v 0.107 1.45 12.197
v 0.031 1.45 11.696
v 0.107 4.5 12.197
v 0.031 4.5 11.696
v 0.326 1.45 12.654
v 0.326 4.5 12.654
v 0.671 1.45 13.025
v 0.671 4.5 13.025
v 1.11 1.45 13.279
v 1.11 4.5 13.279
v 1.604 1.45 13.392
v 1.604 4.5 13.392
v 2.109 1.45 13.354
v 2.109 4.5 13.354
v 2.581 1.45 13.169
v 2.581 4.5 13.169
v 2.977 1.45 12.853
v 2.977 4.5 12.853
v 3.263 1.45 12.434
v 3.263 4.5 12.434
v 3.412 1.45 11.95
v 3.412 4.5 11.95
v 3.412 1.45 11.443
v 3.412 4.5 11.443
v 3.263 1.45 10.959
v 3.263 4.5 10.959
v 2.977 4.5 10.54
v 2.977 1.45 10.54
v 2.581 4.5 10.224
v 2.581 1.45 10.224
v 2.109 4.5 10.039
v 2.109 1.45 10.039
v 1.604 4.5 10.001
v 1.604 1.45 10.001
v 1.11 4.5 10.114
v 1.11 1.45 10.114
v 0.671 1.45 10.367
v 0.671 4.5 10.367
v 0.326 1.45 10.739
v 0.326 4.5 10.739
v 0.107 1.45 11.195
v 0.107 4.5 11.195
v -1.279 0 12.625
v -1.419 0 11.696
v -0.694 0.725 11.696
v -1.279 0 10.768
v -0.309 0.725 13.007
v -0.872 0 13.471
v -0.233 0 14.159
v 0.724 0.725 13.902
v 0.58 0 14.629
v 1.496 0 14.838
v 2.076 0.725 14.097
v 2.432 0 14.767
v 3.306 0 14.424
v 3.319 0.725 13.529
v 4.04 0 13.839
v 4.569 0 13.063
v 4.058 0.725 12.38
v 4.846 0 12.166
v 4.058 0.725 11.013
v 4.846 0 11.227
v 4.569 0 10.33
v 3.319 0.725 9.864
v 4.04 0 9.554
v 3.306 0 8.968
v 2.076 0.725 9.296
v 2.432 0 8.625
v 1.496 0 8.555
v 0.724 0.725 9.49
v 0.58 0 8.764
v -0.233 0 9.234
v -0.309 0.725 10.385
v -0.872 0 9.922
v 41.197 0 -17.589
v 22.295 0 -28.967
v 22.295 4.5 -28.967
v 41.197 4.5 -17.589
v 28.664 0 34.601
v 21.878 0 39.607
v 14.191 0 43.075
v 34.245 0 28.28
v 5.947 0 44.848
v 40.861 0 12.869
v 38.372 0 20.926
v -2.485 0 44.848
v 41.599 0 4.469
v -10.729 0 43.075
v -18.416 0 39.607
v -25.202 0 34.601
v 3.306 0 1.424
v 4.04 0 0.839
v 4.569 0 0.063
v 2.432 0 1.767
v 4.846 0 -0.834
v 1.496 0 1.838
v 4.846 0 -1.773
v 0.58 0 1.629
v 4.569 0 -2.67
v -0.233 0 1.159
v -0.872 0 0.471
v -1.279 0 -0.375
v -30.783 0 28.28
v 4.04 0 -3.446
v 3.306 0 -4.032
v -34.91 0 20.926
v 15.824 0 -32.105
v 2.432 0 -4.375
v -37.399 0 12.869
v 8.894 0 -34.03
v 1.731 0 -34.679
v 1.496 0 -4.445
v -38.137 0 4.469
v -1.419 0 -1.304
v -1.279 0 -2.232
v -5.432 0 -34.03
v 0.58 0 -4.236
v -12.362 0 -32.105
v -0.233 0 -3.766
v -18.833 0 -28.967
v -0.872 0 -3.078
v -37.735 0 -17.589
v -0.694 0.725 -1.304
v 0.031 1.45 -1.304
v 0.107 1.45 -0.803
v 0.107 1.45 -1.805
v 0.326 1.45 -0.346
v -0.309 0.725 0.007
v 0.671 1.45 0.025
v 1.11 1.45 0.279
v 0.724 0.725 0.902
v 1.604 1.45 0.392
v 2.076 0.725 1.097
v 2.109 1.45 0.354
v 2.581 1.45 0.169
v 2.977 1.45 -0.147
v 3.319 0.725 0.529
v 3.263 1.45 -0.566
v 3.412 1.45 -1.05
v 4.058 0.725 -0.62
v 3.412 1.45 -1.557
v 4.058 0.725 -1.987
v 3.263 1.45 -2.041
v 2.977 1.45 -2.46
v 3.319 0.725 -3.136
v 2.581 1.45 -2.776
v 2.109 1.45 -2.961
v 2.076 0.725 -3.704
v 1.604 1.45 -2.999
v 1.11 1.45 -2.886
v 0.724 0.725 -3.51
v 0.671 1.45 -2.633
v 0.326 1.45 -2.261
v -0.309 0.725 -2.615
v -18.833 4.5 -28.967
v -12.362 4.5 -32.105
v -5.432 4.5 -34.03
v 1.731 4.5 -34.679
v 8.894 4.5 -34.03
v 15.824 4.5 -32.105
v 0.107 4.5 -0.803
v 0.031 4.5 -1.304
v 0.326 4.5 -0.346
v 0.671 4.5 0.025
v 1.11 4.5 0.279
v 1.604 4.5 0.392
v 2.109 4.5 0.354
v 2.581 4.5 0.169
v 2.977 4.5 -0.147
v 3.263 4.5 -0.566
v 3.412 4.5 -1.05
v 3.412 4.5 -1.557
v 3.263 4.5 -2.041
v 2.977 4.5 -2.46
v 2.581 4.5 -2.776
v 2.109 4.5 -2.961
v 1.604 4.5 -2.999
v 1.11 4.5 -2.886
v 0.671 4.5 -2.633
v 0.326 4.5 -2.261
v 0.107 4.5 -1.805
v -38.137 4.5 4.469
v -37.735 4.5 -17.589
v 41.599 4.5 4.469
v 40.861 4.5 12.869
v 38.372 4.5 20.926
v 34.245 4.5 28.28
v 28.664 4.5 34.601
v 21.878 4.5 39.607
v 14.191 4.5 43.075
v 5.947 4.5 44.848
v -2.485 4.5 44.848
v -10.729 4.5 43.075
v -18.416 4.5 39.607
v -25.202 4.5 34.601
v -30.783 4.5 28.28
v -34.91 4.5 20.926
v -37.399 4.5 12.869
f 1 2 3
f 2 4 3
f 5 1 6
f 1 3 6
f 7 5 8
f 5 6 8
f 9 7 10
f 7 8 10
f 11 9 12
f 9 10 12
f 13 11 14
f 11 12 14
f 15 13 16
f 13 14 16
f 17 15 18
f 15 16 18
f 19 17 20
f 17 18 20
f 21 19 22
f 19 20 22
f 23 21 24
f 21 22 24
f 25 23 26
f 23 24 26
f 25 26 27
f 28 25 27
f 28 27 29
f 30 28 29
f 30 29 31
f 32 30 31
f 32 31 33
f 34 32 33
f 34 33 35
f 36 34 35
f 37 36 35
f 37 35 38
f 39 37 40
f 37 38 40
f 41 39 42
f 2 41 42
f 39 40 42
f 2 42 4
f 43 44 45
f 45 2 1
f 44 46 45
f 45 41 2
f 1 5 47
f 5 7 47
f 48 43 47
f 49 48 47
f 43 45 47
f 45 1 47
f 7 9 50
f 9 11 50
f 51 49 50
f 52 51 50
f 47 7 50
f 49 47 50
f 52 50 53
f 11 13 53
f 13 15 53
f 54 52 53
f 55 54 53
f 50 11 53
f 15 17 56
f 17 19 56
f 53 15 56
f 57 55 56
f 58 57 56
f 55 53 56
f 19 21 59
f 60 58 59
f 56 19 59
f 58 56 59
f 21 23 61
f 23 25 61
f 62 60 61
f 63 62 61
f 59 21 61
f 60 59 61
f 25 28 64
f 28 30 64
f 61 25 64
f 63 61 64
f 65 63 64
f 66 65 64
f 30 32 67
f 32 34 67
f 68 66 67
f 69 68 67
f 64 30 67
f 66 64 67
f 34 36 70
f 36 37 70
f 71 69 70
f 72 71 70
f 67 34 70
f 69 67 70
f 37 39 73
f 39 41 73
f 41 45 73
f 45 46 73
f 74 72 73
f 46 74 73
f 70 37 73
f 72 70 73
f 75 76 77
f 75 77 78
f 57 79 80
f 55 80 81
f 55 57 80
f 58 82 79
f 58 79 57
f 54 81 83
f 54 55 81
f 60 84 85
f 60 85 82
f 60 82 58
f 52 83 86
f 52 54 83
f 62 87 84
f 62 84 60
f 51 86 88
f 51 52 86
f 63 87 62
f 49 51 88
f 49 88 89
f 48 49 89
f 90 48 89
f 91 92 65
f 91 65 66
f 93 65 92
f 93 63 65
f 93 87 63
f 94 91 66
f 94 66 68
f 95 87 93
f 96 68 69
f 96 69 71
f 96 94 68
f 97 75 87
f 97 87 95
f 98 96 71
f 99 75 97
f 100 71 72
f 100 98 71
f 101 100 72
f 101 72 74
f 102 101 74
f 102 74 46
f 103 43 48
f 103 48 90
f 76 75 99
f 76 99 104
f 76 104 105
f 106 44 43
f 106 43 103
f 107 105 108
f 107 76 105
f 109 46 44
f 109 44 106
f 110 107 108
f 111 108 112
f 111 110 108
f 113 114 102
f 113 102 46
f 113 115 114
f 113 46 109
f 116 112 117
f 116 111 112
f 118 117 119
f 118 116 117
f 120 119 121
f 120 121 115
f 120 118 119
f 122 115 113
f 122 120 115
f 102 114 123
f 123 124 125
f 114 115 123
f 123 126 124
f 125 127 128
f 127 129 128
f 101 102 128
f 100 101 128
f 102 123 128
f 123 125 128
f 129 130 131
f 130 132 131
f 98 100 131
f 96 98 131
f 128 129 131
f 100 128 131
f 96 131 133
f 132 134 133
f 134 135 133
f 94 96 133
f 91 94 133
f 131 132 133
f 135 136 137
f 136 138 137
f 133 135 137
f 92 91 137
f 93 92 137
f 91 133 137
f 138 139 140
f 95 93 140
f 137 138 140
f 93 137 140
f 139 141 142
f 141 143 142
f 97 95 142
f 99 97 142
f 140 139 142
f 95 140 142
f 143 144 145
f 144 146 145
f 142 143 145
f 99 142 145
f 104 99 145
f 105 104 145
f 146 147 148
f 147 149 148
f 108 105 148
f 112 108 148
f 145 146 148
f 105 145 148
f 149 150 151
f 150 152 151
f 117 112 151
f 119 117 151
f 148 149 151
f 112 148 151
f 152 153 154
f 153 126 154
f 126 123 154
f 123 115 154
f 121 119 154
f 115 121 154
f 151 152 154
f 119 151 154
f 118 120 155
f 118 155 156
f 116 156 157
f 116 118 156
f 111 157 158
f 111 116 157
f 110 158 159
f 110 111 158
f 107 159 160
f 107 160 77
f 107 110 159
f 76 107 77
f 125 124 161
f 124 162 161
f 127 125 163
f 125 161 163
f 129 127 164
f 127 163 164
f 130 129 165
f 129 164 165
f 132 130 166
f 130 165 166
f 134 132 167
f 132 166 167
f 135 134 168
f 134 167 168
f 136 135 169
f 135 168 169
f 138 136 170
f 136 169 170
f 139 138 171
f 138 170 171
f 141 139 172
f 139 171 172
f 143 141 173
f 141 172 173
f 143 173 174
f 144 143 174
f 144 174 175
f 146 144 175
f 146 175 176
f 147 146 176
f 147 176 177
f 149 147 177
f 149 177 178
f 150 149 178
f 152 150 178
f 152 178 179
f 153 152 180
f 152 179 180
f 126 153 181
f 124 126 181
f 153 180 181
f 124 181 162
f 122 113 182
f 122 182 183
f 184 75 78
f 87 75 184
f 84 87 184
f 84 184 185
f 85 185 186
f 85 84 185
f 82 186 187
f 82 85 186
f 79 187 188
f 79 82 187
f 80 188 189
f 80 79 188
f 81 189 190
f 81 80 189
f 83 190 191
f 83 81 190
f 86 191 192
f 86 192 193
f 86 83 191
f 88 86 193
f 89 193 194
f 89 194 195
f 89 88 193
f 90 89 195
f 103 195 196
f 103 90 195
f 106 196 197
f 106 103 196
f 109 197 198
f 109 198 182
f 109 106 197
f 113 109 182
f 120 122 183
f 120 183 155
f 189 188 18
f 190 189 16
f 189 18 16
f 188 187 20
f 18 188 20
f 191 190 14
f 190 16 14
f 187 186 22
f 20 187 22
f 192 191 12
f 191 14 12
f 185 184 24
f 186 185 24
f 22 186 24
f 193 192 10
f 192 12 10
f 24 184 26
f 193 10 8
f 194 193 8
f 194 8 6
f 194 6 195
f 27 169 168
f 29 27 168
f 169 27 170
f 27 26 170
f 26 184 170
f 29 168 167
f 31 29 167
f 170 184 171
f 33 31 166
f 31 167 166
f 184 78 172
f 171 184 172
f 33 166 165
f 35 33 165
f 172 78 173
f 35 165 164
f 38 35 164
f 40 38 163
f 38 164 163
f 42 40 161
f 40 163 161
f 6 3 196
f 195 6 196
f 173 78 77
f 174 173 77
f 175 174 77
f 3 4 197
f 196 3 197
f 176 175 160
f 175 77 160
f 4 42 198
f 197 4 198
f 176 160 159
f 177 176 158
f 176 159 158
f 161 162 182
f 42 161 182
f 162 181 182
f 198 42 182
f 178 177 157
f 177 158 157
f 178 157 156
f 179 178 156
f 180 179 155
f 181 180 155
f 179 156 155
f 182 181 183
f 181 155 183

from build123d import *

# Parameters (mm, degrees)
BOSS_EXTRUDE4_DEPTH                             = 4.5
CSK_FOR_M3_FLAT_HEAD_MACHINE_SCREW1_D           = 3.4
CSK_FOR_M3_FLAT_HEAD_MACHINE_SCREW1_CSINK_D     = 6.3
CSK_FOR_M3_FLAT_HEAD_MACHINE_SCREW1_CSINK_ANGLE = 90


with BuildPart() as part:
    # Sketch6 → Boss-Extrude4 (new body)
    with BuildSketch(Plane(origin=(0, 0, 0), x_dir=(1, 0, 0), z_dir=(0, 1, 0))):
        with BuildLine():
            Line((-37.735031535, 17.5893733), (-18.832983626, 28.967073503))
            ThreePointArc((-18.832983626, 28.967073503), (1.730983294, 34.678659015), (22.294950215, 28.967073503))
            Line((22.294950215, 28.967073503), (41.196998124, 17.5893733))
            Line((41.196998124, 17.5893733), (41.599351581, -4.469130473))
            ThreePointArc((41.599351581, -4.469130473), (1.730983294, -45.071340985), (-38.137384993, -4.469130473))
            Line((-38.137384993, -4.469130473), (-37.735031535, 17.5893733))
        make_face()
    extrude(amount=BOSS_EXTRUDE4_DEPTH)

    # CSK for M3 Flat Head Machine Screw1 (through all)
    with Locations(Plane(origin=(0, 0, 5.6), x_dir=(1, 0, 0), z_dir=(0, -1, 0))):
        with Locations((1.730983294, -6.903659015), (1.730983294, 6.096340985)):
            CounterSinkHole(CSK_FOR_M3_FLAT_HEAD_MACHINE_SCREW1_D / 2, CSK_FOR_M3_FLAT_HEAD_MACHINE_SCREW1_CSINK_D / 2, counter_sink_angle=CSK_FOR_M3_FLAT_HEAD_MACHINE_SCREW1_CSINK_ANGLE)


solid = part.part
